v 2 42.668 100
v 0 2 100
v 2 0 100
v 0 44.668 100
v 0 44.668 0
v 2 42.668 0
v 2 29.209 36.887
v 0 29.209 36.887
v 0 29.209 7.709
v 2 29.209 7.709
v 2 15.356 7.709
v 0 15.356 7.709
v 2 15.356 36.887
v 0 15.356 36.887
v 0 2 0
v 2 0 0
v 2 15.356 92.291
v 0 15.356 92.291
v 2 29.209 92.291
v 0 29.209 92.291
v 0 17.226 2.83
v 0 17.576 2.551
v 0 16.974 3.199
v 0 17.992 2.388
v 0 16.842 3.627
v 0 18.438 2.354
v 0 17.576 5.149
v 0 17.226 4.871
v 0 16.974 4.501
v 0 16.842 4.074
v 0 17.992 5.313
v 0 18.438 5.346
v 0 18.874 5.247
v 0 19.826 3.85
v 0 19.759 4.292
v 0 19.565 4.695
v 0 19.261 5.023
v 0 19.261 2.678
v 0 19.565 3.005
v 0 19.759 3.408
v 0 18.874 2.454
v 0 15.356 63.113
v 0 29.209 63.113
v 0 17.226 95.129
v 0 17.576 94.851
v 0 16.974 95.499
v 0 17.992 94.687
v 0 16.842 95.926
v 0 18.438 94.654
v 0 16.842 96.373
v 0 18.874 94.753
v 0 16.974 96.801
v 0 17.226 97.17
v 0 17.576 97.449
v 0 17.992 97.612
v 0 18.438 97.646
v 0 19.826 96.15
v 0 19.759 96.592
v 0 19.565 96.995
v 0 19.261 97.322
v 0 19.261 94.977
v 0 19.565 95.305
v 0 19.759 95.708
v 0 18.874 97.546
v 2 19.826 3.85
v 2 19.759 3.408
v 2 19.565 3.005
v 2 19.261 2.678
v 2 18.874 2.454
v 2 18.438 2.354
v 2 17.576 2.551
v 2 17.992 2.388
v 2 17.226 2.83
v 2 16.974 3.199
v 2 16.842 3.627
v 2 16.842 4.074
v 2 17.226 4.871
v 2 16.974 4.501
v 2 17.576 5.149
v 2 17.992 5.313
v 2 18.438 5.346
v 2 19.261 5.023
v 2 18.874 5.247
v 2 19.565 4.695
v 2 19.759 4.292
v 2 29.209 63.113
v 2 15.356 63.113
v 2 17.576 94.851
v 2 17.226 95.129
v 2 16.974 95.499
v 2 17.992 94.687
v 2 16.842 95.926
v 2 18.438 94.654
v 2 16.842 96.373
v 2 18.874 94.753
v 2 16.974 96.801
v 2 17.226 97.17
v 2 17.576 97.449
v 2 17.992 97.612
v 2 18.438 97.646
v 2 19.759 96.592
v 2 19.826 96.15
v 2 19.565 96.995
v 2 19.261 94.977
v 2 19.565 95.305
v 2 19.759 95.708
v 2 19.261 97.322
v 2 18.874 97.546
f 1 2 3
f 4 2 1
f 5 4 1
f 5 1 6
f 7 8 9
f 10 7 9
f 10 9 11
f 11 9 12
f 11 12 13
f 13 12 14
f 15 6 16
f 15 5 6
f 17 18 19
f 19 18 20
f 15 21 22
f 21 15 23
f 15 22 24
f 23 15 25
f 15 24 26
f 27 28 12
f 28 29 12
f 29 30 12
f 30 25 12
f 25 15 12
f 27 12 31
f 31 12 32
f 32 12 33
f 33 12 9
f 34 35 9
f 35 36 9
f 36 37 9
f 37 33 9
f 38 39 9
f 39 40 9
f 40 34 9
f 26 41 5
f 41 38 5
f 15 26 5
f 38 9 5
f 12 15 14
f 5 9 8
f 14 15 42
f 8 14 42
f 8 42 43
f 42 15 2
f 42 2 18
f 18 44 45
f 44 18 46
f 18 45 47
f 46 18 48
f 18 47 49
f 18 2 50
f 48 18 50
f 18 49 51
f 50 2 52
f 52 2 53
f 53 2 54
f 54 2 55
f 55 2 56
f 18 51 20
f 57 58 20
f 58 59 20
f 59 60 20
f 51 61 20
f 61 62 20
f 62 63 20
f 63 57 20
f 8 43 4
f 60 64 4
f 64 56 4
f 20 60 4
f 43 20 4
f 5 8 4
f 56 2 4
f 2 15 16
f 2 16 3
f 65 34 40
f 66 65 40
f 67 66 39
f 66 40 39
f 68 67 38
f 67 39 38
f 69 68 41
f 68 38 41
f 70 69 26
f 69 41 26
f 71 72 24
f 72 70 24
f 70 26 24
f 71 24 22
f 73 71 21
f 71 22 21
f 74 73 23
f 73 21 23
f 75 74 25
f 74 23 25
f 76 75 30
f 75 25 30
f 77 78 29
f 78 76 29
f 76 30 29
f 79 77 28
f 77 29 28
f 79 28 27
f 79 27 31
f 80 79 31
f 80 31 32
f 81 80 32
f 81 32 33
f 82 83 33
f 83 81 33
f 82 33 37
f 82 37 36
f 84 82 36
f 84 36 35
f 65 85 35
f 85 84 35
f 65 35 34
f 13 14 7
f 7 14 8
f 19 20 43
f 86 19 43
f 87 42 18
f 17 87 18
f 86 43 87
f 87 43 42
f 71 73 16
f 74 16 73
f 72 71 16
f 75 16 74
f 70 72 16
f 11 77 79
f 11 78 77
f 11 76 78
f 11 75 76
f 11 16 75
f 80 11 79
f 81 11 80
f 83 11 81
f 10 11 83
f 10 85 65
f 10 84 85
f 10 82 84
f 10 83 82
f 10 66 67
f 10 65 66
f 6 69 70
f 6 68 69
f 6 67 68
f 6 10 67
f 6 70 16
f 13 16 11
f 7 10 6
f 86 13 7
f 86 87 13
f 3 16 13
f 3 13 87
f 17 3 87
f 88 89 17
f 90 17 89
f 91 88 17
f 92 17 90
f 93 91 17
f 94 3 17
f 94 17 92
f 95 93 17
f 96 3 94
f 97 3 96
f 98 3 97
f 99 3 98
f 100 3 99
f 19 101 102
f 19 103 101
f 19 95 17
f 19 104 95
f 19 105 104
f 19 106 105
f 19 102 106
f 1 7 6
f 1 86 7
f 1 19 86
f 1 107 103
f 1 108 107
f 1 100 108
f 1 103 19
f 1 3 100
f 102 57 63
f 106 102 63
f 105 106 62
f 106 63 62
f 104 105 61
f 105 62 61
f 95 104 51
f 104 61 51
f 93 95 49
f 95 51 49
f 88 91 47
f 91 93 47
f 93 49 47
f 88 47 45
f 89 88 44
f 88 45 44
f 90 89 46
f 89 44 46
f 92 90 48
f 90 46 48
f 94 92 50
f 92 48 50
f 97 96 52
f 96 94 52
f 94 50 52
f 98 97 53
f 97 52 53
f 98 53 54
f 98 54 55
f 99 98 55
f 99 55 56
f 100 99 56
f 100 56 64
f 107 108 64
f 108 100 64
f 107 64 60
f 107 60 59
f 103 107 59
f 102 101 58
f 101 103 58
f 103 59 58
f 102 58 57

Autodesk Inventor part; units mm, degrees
ref_plane "YZ Plane" through (0, 0, 0) normal (1, 0, 0) x (0, 1, 0)
ref_plane "XZ Plane" through (0, 0, 0) normal (0, 1, 0) x (-1, 0, 0)
ref_plane "XY Plane" through (0, 0, 0) normal (0, 0, 1) x (1, 0, 0)
sketch "Szkic1" plane through (0, 0, 0) normal (1, 0, 0) x (0, 1, 0)
  circle A0 centre (18.3256, 3.8503) radius 1.5
  circle A1 centre (18.3256, 96.1497) radius 1.5
  line L0 (15.3555, 36.8868) -> (29.2091, 36.8868)
  line L1 (29.2091, 36.8868) -> (29.2091, 7.7086)
  line L2 (29.2091, 7.7086) -> (15.3555, 7.7086)
  line L3 (15.3555, 7.7086) -> (15.3555, 36.8868)
  line L4 (15.3555, 92.2914) -> (29.2091, 92.2914)
  line L5 (29.2091, 92.2914) -> (29.2091, 63.1132)
  line L6 (29.2091, 63.1132) -> (15.3555, 63.1132)
  line L7 (15.3555, 63.1132) -> (15.3555, 92.2914)
  line L8 (0, 100) -> (43.598, 100)
  line L9 (0, 100) -> (0, 0)
  line L10 (43.598, 0) -> (0, 0)
  line L11 (43.598, 100) -> (43.598, 0)
  line L12 (43.598, 100) -> (44.6676, 100)
  line L13 (43.598, 100) -> (43.598, 0)
  line L14 (44.6676, 0) -> (43.598, 0)
  line L15 (44.6676, 100) -> (44.6676, 0)
  point P0 (33.9001, 100)
extrude "Wyciągnięcie proste1" add sketch "Szkic1" along normal blind 2
chamfer "Faza1" distance 2 angle 45 1 edges at (2, 44.6676, 50)
chamfer "Faza2" distance 2 angle 45 1 edges at (0, 0, 50)
properties part number "kopia_plug"
